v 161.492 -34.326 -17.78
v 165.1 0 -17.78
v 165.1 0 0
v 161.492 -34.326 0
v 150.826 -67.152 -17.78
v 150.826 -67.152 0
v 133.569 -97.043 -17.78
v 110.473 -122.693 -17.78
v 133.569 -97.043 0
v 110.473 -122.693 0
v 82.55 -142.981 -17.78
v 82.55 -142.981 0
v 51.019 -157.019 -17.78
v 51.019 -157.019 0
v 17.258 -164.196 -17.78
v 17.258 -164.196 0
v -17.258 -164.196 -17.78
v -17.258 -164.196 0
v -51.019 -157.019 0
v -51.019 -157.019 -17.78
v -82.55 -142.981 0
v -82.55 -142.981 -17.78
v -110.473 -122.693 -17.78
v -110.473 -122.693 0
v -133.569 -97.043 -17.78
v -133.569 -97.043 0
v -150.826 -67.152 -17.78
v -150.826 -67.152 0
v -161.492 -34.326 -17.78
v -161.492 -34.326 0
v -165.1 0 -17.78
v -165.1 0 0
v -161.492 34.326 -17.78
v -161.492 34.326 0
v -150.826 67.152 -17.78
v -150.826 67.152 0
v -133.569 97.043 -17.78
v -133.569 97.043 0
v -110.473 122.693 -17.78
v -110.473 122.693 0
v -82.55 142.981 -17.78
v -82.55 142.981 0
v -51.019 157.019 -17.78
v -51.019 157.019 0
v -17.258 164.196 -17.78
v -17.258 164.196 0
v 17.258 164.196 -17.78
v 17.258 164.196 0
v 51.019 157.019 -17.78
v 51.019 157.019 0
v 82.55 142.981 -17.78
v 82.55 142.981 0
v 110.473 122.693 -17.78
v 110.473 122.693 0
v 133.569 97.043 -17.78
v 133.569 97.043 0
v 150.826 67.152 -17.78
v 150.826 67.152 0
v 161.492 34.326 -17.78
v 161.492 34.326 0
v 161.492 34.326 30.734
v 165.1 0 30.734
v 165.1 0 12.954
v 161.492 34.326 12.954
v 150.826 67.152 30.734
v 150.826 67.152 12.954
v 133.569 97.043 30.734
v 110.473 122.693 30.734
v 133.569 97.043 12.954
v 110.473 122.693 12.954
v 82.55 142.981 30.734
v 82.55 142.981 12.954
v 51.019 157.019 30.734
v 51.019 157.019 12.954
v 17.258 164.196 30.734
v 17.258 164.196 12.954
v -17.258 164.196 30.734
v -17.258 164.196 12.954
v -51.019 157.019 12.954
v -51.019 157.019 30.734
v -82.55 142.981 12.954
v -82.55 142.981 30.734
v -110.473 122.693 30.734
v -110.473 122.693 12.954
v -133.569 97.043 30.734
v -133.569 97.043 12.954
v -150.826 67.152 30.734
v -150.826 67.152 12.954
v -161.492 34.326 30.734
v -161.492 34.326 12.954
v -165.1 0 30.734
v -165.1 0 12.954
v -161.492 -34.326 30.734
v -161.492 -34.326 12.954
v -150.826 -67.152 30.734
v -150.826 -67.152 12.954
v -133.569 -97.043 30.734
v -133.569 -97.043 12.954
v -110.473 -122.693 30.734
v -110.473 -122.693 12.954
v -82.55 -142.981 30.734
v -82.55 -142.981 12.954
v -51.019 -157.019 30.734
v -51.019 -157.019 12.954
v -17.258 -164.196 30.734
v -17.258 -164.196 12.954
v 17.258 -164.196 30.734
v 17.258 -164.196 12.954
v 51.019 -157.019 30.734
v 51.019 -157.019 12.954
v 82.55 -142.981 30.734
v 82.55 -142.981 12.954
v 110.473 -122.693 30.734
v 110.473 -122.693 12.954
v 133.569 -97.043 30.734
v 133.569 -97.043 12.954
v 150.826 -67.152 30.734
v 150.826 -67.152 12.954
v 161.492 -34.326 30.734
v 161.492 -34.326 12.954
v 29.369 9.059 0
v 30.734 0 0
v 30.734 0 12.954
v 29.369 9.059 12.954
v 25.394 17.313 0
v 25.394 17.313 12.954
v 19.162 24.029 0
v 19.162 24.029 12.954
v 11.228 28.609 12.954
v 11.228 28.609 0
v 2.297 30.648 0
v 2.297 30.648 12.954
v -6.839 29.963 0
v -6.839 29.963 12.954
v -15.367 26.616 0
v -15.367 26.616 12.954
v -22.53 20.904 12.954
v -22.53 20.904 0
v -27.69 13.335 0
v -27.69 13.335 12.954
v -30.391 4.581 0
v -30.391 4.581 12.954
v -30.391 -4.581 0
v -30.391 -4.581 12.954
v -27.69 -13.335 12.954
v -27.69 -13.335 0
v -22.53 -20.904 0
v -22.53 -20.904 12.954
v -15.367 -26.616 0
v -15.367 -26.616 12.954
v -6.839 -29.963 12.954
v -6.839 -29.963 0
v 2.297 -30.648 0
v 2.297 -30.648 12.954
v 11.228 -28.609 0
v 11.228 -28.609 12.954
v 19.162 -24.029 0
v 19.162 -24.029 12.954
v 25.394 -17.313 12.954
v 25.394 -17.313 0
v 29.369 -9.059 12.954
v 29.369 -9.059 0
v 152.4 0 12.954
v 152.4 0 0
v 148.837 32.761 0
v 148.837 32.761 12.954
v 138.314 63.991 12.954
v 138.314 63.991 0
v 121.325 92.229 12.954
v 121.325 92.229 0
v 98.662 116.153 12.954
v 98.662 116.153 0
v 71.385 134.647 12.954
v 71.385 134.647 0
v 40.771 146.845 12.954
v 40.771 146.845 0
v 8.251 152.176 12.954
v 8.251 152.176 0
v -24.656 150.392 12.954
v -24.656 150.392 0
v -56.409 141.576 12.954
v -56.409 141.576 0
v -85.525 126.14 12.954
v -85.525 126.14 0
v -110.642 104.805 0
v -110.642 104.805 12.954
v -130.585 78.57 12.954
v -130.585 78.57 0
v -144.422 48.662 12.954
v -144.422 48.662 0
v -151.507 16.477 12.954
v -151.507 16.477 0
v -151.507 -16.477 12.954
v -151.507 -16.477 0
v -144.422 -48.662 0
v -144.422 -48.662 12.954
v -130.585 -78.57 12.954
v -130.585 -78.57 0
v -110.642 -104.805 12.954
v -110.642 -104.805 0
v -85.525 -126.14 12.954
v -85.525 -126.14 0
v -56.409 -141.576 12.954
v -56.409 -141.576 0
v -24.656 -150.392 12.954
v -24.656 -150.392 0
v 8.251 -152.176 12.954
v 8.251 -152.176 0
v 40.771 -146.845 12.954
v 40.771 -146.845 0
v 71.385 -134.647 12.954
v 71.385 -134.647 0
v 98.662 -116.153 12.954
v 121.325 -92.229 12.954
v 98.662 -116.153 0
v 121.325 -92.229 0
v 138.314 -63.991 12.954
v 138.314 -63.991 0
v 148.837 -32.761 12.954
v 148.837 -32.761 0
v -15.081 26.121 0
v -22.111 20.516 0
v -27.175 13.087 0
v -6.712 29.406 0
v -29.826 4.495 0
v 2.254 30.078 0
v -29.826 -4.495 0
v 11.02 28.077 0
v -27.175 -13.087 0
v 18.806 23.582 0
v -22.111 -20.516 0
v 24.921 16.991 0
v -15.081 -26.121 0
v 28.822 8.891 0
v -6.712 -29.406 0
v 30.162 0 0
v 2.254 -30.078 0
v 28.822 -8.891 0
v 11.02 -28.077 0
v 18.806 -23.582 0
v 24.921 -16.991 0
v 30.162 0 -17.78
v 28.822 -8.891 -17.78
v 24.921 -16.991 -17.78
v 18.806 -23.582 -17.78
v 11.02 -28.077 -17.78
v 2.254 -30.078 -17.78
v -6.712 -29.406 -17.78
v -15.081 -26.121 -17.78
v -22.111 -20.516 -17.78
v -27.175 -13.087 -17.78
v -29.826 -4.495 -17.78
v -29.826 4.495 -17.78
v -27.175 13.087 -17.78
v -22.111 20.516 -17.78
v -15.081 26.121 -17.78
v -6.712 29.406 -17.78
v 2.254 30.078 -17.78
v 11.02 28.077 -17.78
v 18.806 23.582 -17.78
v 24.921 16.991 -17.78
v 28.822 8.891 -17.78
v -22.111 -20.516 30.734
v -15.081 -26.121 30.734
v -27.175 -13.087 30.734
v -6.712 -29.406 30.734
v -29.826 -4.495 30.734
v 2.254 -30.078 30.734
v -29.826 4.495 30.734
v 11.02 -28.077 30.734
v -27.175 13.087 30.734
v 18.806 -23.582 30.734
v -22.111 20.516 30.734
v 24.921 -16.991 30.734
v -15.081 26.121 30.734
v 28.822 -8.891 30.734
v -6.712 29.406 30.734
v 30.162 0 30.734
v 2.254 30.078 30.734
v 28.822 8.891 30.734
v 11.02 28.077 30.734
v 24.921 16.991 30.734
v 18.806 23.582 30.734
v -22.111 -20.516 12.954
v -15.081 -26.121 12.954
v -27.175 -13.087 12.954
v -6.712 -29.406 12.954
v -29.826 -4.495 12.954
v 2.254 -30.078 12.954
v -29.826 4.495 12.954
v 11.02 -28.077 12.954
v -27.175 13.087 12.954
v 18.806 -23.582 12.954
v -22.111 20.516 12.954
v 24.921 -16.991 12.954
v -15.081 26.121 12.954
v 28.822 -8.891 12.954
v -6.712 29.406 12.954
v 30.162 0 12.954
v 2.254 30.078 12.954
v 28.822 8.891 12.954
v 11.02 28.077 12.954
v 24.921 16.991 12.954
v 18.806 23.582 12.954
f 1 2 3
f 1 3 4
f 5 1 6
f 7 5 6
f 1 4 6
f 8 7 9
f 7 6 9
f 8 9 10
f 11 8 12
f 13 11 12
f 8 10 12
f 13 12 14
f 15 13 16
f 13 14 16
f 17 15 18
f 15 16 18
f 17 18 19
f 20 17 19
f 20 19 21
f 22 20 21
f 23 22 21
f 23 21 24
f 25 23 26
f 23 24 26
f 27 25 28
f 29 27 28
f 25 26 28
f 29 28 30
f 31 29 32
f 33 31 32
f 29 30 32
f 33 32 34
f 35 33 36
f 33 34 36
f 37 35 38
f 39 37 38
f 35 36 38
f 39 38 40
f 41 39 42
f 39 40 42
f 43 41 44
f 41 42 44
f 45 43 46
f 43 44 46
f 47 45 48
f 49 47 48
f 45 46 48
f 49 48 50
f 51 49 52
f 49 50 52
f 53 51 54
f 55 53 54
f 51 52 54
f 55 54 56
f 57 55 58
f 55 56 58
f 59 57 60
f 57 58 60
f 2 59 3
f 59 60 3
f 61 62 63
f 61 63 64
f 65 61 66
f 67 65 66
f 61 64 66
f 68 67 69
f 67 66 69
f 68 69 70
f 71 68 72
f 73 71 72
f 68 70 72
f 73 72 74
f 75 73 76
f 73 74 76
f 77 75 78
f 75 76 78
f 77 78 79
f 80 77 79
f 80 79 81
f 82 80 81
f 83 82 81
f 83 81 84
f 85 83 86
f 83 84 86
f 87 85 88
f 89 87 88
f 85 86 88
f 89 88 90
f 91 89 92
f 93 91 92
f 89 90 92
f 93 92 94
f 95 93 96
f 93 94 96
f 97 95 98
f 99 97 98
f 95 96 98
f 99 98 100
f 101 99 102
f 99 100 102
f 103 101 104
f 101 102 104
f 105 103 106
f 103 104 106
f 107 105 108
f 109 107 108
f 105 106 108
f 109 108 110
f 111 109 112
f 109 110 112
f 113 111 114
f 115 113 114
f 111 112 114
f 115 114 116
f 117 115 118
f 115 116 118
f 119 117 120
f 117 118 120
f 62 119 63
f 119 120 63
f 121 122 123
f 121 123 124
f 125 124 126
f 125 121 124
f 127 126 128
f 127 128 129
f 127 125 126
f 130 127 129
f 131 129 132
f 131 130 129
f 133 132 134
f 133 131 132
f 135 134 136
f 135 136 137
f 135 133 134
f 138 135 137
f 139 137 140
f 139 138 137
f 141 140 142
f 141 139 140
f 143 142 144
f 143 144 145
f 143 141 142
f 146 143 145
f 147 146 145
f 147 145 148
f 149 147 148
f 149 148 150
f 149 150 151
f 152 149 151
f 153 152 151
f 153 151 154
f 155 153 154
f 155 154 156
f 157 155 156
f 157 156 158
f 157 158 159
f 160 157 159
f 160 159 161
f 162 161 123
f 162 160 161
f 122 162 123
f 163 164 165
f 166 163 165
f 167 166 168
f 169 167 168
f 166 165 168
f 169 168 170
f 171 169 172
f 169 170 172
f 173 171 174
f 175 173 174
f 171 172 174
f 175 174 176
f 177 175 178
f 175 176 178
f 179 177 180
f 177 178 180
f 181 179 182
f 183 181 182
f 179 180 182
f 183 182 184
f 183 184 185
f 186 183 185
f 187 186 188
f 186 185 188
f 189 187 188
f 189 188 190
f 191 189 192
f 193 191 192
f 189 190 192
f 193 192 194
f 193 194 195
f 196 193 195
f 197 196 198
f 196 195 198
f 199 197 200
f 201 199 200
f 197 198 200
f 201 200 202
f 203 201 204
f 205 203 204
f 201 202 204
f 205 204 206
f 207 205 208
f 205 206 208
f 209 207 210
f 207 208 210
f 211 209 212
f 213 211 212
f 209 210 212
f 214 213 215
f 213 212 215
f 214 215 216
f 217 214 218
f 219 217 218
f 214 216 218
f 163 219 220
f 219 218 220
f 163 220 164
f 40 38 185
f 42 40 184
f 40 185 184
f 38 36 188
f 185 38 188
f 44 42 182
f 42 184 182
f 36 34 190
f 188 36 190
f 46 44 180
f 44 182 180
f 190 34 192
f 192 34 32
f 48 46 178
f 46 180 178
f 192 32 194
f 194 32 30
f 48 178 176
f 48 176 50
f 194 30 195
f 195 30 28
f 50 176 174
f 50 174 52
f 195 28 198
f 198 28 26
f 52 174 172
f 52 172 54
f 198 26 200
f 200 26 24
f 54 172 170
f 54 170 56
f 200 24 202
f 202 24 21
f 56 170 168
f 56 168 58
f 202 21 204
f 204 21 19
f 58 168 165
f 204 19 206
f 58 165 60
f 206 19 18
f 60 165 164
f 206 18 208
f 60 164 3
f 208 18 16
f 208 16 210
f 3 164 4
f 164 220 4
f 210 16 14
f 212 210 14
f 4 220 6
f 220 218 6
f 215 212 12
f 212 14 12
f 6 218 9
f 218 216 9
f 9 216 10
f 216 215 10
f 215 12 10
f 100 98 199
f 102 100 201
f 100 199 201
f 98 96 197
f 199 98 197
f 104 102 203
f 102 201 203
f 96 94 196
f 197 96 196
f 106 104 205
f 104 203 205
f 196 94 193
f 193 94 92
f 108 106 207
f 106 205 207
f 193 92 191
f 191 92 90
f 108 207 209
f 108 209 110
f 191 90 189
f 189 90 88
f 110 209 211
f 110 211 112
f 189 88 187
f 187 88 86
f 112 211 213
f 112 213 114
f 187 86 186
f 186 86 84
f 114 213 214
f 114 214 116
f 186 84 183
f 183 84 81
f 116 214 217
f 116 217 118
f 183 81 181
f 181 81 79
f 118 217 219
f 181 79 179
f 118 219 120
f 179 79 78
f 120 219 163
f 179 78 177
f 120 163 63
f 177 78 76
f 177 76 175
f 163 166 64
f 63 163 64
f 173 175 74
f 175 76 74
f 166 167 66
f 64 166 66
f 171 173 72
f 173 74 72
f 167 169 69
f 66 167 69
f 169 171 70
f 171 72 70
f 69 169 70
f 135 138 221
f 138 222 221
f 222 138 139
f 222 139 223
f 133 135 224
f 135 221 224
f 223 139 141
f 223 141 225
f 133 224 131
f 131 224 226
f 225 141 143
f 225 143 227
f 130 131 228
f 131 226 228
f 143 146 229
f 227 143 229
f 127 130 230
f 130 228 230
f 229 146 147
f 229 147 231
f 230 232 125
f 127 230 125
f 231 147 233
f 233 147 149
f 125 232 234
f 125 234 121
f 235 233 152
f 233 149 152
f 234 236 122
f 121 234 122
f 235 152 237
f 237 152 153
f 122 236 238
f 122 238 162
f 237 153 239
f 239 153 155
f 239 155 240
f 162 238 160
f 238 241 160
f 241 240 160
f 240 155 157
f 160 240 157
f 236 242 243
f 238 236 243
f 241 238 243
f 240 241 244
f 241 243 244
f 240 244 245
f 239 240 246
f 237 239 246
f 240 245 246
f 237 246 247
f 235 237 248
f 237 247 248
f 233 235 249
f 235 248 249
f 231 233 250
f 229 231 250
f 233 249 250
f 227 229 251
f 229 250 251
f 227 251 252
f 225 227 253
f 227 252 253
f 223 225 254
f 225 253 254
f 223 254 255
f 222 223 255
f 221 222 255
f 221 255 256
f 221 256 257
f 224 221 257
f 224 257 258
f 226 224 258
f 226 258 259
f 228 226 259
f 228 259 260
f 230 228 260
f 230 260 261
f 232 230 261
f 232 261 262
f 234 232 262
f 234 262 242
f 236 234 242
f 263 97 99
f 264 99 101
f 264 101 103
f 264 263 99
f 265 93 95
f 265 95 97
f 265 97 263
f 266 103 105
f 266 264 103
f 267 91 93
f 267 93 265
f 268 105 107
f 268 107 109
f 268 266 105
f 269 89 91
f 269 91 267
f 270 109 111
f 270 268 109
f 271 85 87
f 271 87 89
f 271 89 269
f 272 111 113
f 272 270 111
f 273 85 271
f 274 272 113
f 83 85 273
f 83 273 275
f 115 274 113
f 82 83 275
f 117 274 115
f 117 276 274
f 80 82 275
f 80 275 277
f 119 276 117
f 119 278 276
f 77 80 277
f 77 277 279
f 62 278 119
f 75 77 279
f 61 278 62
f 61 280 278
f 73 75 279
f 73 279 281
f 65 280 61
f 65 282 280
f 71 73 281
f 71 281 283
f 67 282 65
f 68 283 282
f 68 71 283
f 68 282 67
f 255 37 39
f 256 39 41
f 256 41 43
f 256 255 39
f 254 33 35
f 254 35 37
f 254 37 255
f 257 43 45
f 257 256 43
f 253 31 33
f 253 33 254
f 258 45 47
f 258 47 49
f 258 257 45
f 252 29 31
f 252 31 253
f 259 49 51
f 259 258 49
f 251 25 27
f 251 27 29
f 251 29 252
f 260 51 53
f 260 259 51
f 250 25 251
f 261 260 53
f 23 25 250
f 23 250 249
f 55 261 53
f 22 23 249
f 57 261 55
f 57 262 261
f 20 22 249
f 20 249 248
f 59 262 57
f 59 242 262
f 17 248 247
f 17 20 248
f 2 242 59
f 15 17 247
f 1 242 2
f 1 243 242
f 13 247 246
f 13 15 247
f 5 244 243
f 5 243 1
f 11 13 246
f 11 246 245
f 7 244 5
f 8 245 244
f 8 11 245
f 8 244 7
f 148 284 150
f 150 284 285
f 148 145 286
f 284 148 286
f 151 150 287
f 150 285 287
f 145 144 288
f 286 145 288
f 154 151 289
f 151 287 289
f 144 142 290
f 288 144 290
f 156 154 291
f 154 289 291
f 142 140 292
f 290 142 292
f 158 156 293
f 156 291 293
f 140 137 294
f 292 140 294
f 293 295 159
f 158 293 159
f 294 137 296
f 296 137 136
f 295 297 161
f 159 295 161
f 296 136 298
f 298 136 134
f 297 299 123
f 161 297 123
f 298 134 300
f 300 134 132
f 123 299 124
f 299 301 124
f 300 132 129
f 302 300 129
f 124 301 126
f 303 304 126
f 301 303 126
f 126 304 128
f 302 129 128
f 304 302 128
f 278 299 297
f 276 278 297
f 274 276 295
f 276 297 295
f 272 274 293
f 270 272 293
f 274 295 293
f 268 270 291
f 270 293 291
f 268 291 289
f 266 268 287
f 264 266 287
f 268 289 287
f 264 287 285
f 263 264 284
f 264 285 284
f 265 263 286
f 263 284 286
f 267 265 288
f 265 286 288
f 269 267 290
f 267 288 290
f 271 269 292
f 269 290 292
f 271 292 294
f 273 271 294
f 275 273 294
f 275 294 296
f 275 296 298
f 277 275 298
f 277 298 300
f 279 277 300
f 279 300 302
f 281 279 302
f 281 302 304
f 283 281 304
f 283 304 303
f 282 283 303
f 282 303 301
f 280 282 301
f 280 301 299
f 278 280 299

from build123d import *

# Parameters (mm, degrees)
F0_R     = 152.4
F0_R_2   = 30.734
F1_DEPTH = 12.954
F2_R     = 165.1
F3_DEPTH = 17.78
F4_R     = 165.1
F5_DEPTH = 17.78
F6_R     = 30.1625
F7_DEPTH = 62.66538


with BuildPart() as f1:
    # F0 (on Top) → F1 (new body)
    with BuildSketch(Plane.XY):
        Circle(F0_R)
        Circle(F0_R_2, mode=Mode.SUBTRACT)
    extrude(amount=F1_DEPTH)

    # F2 (on face) → F3 (join)
    with BuildSketch(Plane(origin=(0, 0, 0), x_dir=(1, 0, 0), z_dir=(0, 0, -1))):
        Circle(F2_R)
    extrude(amount=F3_DEPTH)

    # F4 (on face) → F5 (join)
    with BuildSketch(Plane.XY.offset(12.954)):
        Circle(F4_R)
    extrude(amount=F5_DEPTH)

    # F6 (on face) → F7 (cut)
    with BuildSketch(Plane(origin=(0, 0, -17.78), x_dir=(1, 0, 0), z_dir=(0, 0, -1))):
        Circle(F6_R)
    extrude(amount=-F7_DEPTH, mode=Mode.SUBTRACT)


solid = f1.part
